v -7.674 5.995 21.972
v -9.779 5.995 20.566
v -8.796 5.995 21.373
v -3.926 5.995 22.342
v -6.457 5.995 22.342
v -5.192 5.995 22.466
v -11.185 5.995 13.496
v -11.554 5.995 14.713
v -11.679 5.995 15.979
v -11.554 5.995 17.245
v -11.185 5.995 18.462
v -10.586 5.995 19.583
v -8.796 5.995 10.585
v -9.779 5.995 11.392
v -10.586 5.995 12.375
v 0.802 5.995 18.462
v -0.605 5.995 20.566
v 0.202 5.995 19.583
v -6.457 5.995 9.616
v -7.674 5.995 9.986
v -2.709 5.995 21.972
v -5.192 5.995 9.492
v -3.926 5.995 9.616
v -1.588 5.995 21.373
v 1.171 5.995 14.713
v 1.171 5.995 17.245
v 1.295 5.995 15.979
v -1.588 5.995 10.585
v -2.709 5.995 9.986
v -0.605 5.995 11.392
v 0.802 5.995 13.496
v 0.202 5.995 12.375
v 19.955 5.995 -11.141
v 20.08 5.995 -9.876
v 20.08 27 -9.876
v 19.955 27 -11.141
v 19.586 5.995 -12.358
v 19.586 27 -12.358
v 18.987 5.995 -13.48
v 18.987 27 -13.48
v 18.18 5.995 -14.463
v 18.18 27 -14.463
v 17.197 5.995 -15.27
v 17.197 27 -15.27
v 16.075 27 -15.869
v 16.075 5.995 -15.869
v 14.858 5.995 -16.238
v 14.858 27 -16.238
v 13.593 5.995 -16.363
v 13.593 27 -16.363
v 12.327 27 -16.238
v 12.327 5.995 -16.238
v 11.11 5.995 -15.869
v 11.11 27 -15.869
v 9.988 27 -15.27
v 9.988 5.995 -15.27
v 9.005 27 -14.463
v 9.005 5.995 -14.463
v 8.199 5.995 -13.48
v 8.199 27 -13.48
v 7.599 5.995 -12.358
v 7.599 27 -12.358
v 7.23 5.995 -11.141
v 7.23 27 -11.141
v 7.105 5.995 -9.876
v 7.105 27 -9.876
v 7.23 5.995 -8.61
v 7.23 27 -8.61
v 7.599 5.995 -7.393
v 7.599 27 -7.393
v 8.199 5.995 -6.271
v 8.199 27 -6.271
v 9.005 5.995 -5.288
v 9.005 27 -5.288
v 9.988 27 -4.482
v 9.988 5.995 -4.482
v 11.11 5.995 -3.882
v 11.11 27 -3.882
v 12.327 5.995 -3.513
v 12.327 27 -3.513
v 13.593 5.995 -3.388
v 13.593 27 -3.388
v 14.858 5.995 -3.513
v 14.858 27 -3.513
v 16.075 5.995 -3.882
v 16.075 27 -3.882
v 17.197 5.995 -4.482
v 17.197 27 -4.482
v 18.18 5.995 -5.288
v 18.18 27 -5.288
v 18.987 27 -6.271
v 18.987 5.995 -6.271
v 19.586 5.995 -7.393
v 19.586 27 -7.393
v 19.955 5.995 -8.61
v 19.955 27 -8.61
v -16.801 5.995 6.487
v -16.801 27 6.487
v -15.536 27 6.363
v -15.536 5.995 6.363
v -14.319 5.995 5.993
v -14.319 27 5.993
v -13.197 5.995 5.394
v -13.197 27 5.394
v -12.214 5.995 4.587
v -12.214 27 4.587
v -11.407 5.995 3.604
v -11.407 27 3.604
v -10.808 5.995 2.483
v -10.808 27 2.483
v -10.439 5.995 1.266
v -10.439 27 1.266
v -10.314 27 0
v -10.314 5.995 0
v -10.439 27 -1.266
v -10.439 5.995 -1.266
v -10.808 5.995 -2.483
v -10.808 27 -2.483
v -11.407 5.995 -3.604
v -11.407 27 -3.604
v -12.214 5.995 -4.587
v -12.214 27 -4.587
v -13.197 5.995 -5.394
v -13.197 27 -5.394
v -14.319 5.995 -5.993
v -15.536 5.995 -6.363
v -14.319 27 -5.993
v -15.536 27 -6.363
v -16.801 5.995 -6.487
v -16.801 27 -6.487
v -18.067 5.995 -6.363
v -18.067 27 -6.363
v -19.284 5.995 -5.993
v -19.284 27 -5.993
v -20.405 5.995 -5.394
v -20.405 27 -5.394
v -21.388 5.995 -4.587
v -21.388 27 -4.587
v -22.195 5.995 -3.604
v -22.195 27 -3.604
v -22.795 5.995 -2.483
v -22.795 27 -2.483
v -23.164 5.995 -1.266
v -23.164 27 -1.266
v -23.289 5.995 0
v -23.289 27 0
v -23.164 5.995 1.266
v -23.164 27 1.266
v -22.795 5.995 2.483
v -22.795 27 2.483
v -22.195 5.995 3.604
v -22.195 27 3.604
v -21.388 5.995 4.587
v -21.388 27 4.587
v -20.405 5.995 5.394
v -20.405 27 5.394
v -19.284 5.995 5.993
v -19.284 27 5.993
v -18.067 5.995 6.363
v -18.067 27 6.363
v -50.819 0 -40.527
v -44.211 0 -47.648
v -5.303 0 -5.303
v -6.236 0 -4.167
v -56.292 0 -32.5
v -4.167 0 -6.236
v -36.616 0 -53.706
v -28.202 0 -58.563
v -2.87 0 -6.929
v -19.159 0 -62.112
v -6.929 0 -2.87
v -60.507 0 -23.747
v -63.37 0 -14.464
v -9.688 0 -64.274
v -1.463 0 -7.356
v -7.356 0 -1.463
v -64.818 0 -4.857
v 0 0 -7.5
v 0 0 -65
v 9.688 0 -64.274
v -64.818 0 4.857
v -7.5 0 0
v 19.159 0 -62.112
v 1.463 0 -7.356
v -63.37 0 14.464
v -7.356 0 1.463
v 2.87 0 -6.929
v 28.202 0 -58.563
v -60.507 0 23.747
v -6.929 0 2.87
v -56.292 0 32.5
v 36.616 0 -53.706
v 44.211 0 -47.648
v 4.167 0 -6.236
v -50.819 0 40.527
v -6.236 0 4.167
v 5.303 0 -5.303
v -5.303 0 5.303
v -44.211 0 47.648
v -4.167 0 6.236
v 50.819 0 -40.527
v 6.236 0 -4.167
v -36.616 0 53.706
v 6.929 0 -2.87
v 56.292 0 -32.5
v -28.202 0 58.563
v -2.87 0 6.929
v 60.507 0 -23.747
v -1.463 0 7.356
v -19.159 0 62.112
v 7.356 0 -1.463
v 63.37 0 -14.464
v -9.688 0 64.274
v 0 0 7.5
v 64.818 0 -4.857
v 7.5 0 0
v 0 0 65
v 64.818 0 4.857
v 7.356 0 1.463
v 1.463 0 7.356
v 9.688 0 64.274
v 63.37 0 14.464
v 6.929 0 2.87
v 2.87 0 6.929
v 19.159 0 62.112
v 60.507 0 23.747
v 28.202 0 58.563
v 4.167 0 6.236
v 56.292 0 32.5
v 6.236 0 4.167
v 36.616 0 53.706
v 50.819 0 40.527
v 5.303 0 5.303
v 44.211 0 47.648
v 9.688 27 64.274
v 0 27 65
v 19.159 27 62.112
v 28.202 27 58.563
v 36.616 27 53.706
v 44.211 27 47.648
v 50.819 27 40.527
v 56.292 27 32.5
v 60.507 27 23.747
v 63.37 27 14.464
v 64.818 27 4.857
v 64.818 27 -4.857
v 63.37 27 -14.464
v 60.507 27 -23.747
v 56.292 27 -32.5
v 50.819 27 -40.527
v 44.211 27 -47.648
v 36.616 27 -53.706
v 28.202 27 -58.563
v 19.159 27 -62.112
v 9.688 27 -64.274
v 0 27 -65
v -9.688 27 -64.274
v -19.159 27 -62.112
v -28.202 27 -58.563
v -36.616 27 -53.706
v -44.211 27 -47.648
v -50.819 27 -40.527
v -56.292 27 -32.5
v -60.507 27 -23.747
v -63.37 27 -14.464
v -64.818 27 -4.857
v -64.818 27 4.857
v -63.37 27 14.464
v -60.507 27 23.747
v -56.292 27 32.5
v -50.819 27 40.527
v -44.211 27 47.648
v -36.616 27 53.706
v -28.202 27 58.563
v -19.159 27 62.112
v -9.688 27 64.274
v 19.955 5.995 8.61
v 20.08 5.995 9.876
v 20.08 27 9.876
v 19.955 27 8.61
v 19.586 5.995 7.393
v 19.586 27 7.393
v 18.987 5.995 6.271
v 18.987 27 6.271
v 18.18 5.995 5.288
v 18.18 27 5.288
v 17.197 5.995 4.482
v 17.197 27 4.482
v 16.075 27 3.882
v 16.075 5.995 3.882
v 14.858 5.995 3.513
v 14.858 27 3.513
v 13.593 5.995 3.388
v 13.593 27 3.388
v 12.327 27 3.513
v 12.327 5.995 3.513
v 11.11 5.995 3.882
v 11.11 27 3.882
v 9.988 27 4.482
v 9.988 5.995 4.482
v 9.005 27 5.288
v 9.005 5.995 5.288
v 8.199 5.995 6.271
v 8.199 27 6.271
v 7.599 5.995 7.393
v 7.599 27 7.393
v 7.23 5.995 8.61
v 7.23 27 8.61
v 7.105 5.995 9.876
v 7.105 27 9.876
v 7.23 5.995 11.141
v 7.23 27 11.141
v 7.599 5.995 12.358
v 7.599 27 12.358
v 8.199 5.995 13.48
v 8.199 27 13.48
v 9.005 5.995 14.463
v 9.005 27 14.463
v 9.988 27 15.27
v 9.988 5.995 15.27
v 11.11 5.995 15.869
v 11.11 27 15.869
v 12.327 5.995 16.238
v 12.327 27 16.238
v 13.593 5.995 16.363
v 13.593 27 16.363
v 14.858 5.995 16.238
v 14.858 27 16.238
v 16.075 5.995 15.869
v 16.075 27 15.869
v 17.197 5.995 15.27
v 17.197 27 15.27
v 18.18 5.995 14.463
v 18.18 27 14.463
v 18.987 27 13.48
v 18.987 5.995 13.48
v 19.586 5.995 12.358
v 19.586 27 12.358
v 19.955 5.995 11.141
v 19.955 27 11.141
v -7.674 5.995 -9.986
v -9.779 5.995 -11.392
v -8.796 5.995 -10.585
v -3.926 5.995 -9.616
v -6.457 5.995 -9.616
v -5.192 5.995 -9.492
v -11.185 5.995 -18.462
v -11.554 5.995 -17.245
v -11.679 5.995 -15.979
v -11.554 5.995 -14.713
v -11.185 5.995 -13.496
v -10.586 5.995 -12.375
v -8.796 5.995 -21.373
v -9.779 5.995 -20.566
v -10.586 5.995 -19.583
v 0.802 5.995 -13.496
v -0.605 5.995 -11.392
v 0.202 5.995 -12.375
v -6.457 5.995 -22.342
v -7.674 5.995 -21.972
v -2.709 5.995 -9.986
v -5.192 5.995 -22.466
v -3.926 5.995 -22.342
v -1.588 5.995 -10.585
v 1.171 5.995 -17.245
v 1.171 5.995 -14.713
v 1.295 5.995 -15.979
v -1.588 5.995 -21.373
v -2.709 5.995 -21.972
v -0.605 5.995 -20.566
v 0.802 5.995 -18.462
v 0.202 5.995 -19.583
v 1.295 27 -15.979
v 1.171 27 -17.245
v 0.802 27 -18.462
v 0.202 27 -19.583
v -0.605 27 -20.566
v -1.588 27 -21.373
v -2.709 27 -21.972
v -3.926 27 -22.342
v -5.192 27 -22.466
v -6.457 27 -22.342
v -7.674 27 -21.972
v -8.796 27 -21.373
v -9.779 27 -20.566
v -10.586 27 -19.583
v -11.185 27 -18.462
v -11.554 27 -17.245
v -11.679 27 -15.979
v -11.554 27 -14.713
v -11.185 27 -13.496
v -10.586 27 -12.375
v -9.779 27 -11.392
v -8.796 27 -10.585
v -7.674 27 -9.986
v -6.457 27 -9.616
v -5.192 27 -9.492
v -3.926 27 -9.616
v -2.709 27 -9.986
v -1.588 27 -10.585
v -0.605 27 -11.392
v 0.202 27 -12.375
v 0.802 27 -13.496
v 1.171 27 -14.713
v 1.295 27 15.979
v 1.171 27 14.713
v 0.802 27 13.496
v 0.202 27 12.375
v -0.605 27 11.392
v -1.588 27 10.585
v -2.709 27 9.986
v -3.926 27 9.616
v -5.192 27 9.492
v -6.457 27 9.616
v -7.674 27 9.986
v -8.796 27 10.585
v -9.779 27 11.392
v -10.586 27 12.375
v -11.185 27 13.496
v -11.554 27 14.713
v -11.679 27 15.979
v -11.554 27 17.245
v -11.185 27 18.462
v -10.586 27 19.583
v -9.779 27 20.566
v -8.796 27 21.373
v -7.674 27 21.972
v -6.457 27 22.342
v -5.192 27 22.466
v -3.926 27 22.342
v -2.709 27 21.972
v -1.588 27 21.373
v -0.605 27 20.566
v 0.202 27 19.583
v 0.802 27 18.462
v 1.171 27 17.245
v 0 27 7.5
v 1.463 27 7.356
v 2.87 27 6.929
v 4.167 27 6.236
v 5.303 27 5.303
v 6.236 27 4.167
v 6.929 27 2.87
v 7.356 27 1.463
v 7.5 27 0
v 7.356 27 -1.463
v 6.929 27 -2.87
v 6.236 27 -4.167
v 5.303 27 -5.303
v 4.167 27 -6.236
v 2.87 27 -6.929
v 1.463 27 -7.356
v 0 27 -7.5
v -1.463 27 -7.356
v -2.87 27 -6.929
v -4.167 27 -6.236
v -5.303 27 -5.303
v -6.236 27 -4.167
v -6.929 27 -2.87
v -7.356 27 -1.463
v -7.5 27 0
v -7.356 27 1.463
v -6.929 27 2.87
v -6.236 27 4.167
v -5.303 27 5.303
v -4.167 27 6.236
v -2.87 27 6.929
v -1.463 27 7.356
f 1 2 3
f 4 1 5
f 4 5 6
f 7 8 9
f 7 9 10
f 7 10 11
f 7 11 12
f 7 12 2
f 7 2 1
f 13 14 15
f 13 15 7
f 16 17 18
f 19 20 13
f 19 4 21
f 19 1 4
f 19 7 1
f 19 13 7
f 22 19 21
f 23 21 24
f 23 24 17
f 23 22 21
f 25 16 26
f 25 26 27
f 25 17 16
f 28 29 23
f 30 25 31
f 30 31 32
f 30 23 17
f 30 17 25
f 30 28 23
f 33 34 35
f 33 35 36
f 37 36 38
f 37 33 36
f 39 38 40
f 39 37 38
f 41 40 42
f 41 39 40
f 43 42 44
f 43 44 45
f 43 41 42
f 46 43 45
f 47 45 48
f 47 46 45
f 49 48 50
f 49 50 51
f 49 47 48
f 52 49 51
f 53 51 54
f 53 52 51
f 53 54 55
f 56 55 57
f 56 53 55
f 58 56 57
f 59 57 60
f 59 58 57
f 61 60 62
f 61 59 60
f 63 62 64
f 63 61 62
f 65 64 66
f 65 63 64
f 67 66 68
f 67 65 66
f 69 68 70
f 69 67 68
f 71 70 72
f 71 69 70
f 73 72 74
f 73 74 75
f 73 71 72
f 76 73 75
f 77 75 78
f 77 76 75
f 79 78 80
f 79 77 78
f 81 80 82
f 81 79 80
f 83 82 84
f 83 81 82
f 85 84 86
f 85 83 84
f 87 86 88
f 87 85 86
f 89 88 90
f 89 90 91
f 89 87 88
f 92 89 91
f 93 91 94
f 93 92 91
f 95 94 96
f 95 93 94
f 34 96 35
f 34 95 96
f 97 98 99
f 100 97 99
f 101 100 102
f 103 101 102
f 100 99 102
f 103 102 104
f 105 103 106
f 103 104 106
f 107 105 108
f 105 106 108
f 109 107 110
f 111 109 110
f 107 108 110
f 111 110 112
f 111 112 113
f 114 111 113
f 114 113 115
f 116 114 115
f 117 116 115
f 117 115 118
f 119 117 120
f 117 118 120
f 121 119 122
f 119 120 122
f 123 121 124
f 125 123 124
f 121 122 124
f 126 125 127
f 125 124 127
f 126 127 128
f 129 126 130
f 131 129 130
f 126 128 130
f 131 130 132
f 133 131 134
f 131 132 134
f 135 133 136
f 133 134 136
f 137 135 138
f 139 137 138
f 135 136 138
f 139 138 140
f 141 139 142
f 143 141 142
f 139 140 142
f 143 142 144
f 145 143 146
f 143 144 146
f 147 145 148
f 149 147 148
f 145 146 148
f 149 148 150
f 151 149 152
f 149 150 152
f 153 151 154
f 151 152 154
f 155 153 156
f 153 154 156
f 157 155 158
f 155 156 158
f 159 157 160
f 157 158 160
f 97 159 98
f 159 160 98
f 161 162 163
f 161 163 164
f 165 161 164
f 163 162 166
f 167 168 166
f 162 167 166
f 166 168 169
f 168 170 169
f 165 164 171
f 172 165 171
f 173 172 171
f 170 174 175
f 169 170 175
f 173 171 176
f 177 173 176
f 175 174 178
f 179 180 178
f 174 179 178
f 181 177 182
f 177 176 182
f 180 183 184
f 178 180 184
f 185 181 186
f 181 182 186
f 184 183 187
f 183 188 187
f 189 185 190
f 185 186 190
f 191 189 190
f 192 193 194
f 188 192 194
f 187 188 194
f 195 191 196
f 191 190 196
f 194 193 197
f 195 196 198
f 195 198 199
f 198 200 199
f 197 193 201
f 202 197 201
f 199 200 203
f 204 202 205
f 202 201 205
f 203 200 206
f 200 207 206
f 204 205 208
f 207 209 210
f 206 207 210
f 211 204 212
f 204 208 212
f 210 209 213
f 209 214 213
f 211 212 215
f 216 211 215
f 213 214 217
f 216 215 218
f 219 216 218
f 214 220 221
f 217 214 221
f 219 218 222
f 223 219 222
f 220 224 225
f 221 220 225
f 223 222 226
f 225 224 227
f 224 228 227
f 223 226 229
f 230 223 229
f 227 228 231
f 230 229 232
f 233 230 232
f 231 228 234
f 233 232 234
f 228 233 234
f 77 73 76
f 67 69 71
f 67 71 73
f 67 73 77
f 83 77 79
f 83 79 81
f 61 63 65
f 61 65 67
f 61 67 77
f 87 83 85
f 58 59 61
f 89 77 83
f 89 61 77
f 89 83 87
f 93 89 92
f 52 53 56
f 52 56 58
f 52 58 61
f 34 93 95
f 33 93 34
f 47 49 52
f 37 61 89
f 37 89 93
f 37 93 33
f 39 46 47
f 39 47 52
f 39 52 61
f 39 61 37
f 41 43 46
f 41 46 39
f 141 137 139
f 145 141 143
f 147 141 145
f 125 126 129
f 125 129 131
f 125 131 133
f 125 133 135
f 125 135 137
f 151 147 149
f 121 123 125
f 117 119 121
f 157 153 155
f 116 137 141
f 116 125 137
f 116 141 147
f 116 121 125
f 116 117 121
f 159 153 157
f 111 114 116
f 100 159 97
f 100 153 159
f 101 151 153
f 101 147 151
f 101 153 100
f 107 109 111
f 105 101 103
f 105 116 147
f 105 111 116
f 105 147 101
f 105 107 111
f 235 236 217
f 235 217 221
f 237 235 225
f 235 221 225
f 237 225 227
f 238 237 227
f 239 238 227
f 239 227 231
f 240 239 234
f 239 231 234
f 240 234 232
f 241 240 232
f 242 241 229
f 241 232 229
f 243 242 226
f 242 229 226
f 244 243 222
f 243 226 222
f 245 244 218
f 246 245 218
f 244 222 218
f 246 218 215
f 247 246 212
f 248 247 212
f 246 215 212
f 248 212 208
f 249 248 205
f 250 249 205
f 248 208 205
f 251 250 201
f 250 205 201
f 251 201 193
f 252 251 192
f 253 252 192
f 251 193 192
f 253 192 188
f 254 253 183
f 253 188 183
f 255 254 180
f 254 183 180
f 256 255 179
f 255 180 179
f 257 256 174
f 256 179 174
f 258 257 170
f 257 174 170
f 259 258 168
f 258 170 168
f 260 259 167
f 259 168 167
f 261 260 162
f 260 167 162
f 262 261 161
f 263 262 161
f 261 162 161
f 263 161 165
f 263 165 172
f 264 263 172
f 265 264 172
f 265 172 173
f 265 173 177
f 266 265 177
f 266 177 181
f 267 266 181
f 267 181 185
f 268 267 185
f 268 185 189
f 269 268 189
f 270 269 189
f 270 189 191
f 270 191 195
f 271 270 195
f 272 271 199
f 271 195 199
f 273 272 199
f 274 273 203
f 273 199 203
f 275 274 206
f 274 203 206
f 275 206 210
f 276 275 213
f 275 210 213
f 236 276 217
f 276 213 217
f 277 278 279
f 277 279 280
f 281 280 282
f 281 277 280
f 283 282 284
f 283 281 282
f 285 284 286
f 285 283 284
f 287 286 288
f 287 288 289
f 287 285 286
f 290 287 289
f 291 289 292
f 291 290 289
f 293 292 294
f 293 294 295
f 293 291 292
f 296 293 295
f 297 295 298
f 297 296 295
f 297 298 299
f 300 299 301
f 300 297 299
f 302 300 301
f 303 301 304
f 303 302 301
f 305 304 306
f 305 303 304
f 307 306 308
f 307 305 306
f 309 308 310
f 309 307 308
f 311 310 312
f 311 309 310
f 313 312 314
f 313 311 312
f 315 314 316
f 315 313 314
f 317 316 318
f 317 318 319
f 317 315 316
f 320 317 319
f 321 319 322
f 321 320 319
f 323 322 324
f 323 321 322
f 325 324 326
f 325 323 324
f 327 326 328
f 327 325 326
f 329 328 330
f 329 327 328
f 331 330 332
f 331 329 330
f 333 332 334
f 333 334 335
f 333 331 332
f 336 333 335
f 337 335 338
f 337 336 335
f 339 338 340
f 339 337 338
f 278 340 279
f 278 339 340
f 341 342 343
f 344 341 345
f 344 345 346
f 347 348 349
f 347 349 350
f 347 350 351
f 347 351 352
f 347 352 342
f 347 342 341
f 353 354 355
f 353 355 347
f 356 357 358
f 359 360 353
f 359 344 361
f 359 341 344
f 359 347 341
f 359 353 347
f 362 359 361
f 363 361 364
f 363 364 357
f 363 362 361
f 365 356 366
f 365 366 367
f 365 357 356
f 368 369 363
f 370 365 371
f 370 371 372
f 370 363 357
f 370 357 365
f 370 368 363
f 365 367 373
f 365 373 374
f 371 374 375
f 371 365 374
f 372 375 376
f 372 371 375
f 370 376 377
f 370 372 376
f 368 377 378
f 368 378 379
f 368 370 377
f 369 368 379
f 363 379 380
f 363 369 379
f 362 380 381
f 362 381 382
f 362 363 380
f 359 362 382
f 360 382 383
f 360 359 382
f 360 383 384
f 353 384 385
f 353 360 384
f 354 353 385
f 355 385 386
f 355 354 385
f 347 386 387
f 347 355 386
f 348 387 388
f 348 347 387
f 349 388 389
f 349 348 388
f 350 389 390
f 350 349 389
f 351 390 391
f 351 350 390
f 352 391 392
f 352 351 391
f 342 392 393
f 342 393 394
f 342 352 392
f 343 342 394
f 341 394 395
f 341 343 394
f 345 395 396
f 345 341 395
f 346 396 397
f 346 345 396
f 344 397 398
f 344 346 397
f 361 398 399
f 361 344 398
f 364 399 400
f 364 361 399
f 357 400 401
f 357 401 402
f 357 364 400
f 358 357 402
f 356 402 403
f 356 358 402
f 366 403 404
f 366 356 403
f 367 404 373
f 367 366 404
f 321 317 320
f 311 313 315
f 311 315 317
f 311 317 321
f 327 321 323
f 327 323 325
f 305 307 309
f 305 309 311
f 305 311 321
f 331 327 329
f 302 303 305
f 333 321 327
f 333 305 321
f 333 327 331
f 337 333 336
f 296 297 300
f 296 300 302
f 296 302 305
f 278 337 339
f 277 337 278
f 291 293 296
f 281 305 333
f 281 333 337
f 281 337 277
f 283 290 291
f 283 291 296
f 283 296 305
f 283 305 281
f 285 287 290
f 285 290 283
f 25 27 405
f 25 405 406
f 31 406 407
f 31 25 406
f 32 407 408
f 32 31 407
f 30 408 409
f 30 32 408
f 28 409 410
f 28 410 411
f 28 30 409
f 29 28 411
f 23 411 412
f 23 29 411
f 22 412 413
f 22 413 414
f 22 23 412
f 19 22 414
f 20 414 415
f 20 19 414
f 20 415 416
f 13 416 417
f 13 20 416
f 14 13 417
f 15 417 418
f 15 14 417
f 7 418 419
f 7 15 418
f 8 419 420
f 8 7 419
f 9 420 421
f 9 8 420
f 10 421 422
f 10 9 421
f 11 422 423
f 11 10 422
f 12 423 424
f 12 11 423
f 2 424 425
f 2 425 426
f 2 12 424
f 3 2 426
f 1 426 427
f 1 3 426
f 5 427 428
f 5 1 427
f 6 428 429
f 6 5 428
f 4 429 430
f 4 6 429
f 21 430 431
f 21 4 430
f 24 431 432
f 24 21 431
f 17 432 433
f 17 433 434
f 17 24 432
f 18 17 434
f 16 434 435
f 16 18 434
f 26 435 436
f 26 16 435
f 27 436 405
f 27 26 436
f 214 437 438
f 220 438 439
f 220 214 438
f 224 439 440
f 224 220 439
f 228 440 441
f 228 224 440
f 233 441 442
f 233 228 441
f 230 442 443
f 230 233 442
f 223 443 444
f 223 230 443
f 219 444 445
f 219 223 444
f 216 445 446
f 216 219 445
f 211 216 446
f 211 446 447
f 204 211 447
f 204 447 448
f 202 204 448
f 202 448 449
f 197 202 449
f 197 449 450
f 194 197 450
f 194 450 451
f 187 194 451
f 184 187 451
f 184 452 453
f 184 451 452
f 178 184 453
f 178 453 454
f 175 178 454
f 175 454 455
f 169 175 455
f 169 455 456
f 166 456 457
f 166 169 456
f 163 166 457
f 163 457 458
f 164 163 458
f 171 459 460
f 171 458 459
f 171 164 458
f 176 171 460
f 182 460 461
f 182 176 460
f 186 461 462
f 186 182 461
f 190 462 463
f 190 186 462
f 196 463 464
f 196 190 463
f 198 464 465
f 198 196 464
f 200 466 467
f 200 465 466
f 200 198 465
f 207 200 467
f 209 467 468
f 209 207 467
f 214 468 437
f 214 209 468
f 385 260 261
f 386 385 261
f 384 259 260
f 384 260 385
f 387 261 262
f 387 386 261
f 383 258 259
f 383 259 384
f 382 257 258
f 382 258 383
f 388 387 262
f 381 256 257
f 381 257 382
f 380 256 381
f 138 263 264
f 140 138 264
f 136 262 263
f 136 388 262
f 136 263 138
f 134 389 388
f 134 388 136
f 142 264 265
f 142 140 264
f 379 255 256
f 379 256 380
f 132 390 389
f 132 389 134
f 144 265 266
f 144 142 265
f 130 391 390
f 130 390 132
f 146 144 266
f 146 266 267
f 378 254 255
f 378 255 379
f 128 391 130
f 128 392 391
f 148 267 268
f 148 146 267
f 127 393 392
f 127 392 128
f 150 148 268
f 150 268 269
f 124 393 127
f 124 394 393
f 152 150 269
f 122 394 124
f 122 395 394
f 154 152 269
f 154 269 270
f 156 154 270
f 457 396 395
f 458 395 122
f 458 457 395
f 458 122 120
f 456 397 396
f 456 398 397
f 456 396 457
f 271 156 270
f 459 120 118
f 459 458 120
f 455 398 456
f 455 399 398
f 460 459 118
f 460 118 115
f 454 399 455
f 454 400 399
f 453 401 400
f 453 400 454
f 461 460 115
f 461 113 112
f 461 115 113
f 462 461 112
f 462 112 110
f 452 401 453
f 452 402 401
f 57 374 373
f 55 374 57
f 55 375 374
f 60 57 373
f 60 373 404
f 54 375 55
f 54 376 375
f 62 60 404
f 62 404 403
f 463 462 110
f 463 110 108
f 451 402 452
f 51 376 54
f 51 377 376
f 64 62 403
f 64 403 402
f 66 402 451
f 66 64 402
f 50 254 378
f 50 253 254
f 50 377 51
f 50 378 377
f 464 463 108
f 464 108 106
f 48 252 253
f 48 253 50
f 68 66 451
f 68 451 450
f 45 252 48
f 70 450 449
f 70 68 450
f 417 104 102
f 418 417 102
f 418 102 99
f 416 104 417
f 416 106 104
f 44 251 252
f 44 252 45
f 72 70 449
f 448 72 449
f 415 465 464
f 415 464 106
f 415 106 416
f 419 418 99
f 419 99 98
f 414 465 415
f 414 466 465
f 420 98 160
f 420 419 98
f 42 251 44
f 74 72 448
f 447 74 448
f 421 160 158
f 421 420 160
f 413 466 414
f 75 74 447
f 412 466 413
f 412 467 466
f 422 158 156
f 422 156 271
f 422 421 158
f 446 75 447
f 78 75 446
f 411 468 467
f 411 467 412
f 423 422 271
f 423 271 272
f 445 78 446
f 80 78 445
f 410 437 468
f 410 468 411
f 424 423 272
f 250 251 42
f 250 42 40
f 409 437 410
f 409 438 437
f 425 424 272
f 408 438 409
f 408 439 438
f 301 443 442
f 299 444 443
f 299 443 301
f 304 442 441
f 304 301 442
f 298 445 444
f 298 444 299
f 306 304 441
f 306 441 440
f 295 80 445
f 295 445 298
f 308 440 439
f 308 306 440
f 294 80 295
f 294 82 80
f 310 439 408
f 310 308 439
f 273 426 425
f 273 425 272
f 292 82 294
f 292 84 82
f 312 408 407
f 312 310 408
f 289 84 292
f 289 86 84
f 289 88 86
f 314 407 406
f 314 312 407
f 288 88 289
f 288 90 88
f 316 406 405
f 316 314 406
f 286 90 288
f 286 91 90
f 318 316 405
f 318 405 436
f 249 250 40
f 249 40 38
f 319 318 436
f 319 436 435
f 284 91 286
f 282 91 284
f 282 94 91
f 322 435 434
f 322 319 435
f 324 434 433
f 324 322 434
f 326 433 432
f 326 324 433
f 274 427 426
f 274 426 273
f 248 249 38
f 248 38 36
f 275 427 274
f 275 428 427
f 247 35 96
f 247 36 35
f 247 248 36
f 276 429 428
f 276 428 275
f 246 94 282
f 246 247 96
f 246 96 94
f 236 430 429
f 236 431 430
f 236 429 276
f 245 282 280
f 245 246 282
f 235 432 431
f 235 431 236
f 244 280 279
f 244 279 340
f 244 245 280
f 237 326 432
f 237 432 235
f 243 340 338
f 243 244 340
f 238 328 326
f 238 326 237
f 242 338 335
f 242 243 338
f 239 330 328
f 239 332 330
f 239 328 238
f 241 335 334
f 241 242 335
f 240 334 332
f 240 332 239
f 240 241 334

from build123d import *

# Parameters (mm, degrees)
SKETCH1_R           = 65
BOSS_EXTRUDE1_DEPTH = 27
SKETCH2_R           = 7.5
CUT_EXTRUDE1_DEPTH  = 96.807097858
SKETCH3_R           = 6.48724829
CUT_EXTRUDE2_DEPTH  = 21.005107189
CIRPATTERN1_COUNT   = 5


with BuildPart() as part:
    # Sketch1 → Boss-Extrude1 (new body)
    with BuildSketch(Plane(origin=(0, 0, 0), x_dir=(1, 0, 0), z_dir=(0, 1, 0))):
        Circle(SKETCH1_R)
    extrude(amount=BOSS_EXTRUDE1_DEPTH)

    # Sketch2 → Cut-Extrude1 (cut, through all)
    with BuildSketch(Plane(origin=(0, 0, 0), x_dir=(1, 0, 0), z_dir=(0, 1, 0))):
        Circle(SKETCH2_R)
    extrude(amount=CUT_EXTRUDE1_DEPTH, mode=Mode.SUBTRACT)

    # Sketch3 → Cut-Extrude2 (cut)
    with BuildSketch(Plane(origin=(0, 27, 0), x_dir=(1, 0, 0), z_dir=(0, 1, 0))):
        with Locations((-16.80132063, 0)):
            Circle(SKETCH3_R)
    cut_extrude2 = extrude(amount=-CUT_EXTRUDE2_DEPTH, mode=Mode.SUBTRACT)

    # CirPattern1: Cut-Extrude2 ×5 about axis
    cirpattern1_axis = Axis((0, 0, 0), (0, 1, 0))
    for i in range(1, CIRPATTERN1_COUNT):
        add(cut_extrude2.rotate(cirpattern1_axis, i * 360 / CIRPATTERN1_COUNT), mode=Mode.SUBTRACT)


solid = part.part
